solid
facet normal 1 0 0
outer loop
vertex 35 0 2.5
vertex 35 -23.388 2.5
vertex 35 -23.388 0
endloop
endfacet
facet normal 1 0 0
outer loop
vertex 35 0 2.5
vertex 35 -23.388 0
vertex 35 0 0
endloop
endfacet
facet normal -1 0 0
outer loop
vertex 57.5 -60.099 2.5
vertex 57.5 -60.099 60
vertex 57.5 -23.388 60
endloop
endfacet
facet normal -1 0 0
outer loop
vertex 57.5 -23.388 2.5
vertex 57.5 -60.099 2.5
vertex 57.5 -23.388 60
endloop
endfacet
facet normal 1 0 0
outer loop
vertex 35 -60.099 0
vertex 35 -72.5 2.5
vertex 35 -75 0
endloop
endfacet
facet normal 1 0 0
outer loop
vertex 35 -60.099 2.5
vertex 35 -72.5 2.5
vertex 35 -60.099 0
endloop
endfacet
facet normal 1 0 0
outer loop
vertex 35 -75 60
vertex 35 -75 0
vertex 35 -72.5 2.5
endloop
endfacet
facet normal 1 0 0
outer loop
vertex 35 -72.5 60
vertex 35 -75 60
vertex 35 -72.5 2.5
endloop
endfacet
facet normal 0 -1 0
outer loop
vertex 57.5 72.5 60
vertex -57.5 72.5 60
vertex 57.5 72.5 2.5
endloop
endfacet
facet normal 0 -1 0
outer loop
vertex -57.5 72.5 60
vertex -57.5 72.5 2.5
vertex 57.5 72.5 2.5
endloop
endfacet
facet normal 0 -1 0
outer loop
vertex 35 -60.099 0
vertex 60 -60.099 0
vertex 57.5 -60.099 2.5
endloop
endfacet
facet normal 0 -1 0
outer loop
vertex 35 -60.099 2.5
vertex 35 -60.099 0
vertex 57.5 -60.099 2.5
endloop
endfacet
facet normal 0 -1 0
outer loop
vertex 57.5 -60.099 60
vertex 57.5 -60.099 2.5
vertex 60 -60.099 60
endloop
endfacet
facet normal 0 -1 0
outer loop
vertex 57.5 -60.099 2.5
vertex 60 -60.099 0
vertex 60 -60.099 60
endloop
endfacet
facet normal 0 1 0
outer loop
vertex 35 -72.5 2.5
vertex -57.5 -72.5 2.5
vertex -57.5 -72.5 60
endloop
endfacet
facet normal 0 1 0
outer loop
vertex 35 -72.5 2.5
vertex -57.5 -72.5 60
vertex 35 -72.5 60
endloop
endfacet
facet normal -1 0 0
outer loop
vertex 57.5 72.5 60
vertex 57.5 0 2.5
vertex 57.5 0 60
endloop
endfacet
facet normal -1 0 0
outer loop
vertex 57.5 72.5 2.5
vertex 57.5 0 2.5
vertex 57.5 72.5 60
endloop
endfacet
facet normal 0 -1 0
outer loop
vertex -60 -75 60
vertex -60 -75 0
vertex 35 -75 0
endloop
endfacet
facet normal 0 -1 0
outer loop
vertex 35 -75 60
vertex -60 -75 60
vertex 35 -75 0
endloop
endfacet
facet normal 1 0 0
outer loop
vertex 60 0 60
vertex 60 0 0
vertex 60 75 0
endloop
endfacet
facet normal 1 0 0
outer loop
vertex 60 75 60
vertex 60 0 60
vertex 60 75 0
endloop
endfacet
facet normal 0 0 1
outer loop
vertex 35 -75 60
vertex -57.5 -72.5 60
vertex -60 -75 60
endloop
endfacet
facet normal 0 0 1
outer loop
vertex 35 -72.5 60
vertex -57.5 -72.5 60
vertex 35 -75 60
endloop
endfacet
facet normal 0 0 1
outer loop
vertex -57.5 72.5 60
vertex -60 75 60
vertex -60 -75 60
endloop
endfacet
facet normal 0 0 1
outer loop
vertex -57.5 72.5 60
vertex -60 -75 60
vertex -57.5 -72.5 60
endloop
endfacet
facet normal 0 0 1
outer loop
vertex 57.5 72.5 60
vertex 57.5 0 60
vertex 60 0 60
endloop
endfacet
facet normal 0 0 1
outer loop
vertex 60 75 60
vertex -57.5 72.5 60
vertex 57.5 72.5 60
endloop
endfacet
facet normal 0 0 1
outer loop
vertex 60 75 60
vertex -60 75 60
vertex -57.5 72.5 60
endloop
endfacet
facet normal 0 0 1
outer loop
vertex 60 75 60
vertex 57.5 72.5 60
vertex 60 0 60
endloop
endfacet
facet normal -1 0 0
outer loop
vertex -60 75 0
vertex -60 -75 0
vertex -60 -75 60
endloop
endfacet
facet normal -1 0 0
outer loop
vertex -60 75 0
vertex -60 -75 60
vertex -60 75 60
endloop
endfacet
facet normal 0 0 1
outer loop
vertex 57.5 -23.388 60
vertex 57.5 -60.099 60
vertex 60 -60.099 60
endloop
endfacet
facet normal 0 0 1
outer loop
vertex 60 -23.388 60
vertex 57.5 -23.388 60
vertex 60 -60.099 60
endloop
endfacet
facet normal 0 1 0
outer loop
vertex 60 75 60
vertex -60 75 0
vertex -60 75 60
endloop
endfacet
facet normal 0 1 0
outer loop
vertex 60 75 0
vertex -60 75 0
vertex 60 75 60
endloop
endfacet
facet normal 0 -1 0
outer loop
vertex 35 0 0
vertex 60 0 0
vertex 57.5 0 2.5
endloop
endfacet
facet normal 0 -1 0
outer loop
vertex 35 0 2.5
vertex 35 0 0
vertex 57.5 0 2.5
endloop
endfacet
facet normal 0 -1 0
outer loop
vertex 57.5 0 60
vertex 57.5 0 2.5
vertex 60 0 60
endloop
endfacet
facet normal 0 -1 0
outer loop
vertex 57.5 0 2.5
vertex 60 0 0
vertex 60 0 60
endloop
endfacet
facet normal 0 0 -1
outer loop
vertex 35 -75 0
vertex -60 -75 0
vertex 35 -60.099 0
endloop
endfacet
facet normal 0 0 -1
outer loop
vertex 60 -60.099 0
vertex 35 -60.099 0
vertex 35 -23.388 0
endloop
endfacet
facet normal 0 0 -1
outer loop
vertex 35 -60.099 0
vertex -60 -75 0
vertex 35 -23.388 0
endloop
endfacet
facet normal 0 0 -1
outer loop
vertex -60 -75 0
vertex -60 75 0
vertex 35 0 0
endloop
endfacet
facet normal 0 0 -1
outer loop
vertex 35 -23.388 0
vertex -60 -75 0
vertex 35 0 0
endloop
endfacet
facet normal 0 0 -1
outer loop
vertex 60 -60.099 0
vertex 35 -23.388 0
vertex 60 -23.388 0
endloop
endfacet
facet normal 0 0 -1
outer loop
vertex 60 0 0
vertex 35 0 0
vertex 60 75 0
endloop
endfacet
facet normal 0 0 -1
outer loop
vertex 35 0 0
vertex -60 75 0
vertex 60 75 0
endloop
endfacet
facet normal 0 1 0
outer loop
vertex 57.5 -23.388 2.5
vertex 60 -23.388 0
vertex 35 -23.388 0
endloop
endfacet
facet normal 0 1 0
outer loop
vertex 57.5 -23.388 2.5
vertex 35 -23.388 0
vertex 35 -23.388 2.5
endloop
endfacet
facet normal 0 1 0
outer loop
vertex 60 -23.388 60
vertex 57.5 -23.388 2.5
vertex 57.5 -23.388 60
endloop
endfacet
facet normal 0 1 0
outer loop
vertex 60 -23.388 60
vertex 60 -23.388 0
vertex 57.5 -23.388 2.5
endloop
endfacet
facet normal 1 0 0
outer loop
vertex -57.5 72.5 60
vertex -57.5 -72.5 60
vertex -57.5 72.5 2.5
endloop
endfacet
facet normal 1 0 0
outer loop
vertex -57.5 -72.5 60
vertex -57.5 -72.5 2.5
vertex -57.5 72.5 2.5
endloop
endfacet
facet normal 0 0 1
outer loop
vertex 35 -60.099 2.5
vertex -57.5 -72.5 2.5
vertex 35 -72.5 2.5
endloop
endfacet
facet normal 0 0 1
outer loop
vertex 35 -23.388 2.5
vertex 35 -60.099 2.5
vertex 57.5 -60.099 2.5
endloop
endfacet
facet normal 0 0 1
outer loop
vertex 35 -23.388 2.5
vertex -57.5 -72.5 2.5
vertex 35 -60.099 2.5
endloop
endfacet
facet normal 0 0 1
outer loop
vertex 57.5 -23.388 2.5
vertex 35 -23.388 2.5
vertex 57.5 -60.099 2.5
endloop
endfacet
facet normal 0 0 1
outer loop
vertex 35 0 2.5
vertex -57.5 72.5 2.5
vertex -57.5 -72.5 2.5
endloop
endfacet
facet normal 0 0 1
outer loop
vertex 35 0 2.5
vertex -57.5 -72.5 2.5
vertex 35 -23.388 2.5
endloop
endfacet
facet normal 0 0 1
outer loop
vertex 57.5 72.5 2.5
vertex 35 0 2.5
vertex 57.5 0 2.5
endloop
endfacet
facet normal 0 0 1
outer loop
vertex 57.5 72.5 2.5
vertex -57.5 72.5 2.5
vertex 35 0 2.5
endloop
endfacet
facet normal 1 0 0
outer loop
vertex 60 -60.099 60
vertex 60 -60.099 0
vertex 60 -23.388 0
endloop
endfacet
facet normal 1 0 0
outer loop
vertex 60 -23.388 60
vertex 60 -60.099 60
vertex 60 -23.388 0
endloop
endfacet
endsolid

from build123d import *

# Parameters (mm, degrees)
F0_W     = 120
F0_H     = 150
F1_DEPTH = 60
F2_T     = -2.5
F3_W     = 7.0065811276
F3_H     = 60
F3_W_2   = 14.9013146758
F4_DEPTH = 25
F5_W     = 23.38815853
F5_H     = 60
F6_DEPTH = 25


with BuildPart() as f1:
    # F0 (on Top) → F1 (new body)
    with BuildSketch(Plane.XY):
        Rectangle(F0_W, F0_H)
    extrude(amount=F1_DEPTH)

    # F2
    f2_openings = [f1.faces().sort_by_distance(p)[0] for p in [
        (0, 0, 60),
    ]]
    offset(amount=F2_T, openings=f2_openings)

    # F3 (on face) → F4 (cut)
    with BuildSketch(Plane.YZ.offset(60)):
        with Locations((-78.5032905638, 30)):
            Rectangle(F3_W, F3_H)
        with Locations((-67.5493426621, 30)):
            Rectangle(F3_W_2, F3_H)
    extrude(amount=-F4_DEPTH, mode=Mode.SUBTRACT)

    # F5 (on face) → F6 (cut)
    with BuildSketch(Plane.YZ.offset(60)):
        with Locations((-11.694079265, 30)):
            Rectangle(F5_W, F5_H)
    extrude(amount=-F6_DEPTH, mode=Mode.SUBTRACT)


solid = f1.part
